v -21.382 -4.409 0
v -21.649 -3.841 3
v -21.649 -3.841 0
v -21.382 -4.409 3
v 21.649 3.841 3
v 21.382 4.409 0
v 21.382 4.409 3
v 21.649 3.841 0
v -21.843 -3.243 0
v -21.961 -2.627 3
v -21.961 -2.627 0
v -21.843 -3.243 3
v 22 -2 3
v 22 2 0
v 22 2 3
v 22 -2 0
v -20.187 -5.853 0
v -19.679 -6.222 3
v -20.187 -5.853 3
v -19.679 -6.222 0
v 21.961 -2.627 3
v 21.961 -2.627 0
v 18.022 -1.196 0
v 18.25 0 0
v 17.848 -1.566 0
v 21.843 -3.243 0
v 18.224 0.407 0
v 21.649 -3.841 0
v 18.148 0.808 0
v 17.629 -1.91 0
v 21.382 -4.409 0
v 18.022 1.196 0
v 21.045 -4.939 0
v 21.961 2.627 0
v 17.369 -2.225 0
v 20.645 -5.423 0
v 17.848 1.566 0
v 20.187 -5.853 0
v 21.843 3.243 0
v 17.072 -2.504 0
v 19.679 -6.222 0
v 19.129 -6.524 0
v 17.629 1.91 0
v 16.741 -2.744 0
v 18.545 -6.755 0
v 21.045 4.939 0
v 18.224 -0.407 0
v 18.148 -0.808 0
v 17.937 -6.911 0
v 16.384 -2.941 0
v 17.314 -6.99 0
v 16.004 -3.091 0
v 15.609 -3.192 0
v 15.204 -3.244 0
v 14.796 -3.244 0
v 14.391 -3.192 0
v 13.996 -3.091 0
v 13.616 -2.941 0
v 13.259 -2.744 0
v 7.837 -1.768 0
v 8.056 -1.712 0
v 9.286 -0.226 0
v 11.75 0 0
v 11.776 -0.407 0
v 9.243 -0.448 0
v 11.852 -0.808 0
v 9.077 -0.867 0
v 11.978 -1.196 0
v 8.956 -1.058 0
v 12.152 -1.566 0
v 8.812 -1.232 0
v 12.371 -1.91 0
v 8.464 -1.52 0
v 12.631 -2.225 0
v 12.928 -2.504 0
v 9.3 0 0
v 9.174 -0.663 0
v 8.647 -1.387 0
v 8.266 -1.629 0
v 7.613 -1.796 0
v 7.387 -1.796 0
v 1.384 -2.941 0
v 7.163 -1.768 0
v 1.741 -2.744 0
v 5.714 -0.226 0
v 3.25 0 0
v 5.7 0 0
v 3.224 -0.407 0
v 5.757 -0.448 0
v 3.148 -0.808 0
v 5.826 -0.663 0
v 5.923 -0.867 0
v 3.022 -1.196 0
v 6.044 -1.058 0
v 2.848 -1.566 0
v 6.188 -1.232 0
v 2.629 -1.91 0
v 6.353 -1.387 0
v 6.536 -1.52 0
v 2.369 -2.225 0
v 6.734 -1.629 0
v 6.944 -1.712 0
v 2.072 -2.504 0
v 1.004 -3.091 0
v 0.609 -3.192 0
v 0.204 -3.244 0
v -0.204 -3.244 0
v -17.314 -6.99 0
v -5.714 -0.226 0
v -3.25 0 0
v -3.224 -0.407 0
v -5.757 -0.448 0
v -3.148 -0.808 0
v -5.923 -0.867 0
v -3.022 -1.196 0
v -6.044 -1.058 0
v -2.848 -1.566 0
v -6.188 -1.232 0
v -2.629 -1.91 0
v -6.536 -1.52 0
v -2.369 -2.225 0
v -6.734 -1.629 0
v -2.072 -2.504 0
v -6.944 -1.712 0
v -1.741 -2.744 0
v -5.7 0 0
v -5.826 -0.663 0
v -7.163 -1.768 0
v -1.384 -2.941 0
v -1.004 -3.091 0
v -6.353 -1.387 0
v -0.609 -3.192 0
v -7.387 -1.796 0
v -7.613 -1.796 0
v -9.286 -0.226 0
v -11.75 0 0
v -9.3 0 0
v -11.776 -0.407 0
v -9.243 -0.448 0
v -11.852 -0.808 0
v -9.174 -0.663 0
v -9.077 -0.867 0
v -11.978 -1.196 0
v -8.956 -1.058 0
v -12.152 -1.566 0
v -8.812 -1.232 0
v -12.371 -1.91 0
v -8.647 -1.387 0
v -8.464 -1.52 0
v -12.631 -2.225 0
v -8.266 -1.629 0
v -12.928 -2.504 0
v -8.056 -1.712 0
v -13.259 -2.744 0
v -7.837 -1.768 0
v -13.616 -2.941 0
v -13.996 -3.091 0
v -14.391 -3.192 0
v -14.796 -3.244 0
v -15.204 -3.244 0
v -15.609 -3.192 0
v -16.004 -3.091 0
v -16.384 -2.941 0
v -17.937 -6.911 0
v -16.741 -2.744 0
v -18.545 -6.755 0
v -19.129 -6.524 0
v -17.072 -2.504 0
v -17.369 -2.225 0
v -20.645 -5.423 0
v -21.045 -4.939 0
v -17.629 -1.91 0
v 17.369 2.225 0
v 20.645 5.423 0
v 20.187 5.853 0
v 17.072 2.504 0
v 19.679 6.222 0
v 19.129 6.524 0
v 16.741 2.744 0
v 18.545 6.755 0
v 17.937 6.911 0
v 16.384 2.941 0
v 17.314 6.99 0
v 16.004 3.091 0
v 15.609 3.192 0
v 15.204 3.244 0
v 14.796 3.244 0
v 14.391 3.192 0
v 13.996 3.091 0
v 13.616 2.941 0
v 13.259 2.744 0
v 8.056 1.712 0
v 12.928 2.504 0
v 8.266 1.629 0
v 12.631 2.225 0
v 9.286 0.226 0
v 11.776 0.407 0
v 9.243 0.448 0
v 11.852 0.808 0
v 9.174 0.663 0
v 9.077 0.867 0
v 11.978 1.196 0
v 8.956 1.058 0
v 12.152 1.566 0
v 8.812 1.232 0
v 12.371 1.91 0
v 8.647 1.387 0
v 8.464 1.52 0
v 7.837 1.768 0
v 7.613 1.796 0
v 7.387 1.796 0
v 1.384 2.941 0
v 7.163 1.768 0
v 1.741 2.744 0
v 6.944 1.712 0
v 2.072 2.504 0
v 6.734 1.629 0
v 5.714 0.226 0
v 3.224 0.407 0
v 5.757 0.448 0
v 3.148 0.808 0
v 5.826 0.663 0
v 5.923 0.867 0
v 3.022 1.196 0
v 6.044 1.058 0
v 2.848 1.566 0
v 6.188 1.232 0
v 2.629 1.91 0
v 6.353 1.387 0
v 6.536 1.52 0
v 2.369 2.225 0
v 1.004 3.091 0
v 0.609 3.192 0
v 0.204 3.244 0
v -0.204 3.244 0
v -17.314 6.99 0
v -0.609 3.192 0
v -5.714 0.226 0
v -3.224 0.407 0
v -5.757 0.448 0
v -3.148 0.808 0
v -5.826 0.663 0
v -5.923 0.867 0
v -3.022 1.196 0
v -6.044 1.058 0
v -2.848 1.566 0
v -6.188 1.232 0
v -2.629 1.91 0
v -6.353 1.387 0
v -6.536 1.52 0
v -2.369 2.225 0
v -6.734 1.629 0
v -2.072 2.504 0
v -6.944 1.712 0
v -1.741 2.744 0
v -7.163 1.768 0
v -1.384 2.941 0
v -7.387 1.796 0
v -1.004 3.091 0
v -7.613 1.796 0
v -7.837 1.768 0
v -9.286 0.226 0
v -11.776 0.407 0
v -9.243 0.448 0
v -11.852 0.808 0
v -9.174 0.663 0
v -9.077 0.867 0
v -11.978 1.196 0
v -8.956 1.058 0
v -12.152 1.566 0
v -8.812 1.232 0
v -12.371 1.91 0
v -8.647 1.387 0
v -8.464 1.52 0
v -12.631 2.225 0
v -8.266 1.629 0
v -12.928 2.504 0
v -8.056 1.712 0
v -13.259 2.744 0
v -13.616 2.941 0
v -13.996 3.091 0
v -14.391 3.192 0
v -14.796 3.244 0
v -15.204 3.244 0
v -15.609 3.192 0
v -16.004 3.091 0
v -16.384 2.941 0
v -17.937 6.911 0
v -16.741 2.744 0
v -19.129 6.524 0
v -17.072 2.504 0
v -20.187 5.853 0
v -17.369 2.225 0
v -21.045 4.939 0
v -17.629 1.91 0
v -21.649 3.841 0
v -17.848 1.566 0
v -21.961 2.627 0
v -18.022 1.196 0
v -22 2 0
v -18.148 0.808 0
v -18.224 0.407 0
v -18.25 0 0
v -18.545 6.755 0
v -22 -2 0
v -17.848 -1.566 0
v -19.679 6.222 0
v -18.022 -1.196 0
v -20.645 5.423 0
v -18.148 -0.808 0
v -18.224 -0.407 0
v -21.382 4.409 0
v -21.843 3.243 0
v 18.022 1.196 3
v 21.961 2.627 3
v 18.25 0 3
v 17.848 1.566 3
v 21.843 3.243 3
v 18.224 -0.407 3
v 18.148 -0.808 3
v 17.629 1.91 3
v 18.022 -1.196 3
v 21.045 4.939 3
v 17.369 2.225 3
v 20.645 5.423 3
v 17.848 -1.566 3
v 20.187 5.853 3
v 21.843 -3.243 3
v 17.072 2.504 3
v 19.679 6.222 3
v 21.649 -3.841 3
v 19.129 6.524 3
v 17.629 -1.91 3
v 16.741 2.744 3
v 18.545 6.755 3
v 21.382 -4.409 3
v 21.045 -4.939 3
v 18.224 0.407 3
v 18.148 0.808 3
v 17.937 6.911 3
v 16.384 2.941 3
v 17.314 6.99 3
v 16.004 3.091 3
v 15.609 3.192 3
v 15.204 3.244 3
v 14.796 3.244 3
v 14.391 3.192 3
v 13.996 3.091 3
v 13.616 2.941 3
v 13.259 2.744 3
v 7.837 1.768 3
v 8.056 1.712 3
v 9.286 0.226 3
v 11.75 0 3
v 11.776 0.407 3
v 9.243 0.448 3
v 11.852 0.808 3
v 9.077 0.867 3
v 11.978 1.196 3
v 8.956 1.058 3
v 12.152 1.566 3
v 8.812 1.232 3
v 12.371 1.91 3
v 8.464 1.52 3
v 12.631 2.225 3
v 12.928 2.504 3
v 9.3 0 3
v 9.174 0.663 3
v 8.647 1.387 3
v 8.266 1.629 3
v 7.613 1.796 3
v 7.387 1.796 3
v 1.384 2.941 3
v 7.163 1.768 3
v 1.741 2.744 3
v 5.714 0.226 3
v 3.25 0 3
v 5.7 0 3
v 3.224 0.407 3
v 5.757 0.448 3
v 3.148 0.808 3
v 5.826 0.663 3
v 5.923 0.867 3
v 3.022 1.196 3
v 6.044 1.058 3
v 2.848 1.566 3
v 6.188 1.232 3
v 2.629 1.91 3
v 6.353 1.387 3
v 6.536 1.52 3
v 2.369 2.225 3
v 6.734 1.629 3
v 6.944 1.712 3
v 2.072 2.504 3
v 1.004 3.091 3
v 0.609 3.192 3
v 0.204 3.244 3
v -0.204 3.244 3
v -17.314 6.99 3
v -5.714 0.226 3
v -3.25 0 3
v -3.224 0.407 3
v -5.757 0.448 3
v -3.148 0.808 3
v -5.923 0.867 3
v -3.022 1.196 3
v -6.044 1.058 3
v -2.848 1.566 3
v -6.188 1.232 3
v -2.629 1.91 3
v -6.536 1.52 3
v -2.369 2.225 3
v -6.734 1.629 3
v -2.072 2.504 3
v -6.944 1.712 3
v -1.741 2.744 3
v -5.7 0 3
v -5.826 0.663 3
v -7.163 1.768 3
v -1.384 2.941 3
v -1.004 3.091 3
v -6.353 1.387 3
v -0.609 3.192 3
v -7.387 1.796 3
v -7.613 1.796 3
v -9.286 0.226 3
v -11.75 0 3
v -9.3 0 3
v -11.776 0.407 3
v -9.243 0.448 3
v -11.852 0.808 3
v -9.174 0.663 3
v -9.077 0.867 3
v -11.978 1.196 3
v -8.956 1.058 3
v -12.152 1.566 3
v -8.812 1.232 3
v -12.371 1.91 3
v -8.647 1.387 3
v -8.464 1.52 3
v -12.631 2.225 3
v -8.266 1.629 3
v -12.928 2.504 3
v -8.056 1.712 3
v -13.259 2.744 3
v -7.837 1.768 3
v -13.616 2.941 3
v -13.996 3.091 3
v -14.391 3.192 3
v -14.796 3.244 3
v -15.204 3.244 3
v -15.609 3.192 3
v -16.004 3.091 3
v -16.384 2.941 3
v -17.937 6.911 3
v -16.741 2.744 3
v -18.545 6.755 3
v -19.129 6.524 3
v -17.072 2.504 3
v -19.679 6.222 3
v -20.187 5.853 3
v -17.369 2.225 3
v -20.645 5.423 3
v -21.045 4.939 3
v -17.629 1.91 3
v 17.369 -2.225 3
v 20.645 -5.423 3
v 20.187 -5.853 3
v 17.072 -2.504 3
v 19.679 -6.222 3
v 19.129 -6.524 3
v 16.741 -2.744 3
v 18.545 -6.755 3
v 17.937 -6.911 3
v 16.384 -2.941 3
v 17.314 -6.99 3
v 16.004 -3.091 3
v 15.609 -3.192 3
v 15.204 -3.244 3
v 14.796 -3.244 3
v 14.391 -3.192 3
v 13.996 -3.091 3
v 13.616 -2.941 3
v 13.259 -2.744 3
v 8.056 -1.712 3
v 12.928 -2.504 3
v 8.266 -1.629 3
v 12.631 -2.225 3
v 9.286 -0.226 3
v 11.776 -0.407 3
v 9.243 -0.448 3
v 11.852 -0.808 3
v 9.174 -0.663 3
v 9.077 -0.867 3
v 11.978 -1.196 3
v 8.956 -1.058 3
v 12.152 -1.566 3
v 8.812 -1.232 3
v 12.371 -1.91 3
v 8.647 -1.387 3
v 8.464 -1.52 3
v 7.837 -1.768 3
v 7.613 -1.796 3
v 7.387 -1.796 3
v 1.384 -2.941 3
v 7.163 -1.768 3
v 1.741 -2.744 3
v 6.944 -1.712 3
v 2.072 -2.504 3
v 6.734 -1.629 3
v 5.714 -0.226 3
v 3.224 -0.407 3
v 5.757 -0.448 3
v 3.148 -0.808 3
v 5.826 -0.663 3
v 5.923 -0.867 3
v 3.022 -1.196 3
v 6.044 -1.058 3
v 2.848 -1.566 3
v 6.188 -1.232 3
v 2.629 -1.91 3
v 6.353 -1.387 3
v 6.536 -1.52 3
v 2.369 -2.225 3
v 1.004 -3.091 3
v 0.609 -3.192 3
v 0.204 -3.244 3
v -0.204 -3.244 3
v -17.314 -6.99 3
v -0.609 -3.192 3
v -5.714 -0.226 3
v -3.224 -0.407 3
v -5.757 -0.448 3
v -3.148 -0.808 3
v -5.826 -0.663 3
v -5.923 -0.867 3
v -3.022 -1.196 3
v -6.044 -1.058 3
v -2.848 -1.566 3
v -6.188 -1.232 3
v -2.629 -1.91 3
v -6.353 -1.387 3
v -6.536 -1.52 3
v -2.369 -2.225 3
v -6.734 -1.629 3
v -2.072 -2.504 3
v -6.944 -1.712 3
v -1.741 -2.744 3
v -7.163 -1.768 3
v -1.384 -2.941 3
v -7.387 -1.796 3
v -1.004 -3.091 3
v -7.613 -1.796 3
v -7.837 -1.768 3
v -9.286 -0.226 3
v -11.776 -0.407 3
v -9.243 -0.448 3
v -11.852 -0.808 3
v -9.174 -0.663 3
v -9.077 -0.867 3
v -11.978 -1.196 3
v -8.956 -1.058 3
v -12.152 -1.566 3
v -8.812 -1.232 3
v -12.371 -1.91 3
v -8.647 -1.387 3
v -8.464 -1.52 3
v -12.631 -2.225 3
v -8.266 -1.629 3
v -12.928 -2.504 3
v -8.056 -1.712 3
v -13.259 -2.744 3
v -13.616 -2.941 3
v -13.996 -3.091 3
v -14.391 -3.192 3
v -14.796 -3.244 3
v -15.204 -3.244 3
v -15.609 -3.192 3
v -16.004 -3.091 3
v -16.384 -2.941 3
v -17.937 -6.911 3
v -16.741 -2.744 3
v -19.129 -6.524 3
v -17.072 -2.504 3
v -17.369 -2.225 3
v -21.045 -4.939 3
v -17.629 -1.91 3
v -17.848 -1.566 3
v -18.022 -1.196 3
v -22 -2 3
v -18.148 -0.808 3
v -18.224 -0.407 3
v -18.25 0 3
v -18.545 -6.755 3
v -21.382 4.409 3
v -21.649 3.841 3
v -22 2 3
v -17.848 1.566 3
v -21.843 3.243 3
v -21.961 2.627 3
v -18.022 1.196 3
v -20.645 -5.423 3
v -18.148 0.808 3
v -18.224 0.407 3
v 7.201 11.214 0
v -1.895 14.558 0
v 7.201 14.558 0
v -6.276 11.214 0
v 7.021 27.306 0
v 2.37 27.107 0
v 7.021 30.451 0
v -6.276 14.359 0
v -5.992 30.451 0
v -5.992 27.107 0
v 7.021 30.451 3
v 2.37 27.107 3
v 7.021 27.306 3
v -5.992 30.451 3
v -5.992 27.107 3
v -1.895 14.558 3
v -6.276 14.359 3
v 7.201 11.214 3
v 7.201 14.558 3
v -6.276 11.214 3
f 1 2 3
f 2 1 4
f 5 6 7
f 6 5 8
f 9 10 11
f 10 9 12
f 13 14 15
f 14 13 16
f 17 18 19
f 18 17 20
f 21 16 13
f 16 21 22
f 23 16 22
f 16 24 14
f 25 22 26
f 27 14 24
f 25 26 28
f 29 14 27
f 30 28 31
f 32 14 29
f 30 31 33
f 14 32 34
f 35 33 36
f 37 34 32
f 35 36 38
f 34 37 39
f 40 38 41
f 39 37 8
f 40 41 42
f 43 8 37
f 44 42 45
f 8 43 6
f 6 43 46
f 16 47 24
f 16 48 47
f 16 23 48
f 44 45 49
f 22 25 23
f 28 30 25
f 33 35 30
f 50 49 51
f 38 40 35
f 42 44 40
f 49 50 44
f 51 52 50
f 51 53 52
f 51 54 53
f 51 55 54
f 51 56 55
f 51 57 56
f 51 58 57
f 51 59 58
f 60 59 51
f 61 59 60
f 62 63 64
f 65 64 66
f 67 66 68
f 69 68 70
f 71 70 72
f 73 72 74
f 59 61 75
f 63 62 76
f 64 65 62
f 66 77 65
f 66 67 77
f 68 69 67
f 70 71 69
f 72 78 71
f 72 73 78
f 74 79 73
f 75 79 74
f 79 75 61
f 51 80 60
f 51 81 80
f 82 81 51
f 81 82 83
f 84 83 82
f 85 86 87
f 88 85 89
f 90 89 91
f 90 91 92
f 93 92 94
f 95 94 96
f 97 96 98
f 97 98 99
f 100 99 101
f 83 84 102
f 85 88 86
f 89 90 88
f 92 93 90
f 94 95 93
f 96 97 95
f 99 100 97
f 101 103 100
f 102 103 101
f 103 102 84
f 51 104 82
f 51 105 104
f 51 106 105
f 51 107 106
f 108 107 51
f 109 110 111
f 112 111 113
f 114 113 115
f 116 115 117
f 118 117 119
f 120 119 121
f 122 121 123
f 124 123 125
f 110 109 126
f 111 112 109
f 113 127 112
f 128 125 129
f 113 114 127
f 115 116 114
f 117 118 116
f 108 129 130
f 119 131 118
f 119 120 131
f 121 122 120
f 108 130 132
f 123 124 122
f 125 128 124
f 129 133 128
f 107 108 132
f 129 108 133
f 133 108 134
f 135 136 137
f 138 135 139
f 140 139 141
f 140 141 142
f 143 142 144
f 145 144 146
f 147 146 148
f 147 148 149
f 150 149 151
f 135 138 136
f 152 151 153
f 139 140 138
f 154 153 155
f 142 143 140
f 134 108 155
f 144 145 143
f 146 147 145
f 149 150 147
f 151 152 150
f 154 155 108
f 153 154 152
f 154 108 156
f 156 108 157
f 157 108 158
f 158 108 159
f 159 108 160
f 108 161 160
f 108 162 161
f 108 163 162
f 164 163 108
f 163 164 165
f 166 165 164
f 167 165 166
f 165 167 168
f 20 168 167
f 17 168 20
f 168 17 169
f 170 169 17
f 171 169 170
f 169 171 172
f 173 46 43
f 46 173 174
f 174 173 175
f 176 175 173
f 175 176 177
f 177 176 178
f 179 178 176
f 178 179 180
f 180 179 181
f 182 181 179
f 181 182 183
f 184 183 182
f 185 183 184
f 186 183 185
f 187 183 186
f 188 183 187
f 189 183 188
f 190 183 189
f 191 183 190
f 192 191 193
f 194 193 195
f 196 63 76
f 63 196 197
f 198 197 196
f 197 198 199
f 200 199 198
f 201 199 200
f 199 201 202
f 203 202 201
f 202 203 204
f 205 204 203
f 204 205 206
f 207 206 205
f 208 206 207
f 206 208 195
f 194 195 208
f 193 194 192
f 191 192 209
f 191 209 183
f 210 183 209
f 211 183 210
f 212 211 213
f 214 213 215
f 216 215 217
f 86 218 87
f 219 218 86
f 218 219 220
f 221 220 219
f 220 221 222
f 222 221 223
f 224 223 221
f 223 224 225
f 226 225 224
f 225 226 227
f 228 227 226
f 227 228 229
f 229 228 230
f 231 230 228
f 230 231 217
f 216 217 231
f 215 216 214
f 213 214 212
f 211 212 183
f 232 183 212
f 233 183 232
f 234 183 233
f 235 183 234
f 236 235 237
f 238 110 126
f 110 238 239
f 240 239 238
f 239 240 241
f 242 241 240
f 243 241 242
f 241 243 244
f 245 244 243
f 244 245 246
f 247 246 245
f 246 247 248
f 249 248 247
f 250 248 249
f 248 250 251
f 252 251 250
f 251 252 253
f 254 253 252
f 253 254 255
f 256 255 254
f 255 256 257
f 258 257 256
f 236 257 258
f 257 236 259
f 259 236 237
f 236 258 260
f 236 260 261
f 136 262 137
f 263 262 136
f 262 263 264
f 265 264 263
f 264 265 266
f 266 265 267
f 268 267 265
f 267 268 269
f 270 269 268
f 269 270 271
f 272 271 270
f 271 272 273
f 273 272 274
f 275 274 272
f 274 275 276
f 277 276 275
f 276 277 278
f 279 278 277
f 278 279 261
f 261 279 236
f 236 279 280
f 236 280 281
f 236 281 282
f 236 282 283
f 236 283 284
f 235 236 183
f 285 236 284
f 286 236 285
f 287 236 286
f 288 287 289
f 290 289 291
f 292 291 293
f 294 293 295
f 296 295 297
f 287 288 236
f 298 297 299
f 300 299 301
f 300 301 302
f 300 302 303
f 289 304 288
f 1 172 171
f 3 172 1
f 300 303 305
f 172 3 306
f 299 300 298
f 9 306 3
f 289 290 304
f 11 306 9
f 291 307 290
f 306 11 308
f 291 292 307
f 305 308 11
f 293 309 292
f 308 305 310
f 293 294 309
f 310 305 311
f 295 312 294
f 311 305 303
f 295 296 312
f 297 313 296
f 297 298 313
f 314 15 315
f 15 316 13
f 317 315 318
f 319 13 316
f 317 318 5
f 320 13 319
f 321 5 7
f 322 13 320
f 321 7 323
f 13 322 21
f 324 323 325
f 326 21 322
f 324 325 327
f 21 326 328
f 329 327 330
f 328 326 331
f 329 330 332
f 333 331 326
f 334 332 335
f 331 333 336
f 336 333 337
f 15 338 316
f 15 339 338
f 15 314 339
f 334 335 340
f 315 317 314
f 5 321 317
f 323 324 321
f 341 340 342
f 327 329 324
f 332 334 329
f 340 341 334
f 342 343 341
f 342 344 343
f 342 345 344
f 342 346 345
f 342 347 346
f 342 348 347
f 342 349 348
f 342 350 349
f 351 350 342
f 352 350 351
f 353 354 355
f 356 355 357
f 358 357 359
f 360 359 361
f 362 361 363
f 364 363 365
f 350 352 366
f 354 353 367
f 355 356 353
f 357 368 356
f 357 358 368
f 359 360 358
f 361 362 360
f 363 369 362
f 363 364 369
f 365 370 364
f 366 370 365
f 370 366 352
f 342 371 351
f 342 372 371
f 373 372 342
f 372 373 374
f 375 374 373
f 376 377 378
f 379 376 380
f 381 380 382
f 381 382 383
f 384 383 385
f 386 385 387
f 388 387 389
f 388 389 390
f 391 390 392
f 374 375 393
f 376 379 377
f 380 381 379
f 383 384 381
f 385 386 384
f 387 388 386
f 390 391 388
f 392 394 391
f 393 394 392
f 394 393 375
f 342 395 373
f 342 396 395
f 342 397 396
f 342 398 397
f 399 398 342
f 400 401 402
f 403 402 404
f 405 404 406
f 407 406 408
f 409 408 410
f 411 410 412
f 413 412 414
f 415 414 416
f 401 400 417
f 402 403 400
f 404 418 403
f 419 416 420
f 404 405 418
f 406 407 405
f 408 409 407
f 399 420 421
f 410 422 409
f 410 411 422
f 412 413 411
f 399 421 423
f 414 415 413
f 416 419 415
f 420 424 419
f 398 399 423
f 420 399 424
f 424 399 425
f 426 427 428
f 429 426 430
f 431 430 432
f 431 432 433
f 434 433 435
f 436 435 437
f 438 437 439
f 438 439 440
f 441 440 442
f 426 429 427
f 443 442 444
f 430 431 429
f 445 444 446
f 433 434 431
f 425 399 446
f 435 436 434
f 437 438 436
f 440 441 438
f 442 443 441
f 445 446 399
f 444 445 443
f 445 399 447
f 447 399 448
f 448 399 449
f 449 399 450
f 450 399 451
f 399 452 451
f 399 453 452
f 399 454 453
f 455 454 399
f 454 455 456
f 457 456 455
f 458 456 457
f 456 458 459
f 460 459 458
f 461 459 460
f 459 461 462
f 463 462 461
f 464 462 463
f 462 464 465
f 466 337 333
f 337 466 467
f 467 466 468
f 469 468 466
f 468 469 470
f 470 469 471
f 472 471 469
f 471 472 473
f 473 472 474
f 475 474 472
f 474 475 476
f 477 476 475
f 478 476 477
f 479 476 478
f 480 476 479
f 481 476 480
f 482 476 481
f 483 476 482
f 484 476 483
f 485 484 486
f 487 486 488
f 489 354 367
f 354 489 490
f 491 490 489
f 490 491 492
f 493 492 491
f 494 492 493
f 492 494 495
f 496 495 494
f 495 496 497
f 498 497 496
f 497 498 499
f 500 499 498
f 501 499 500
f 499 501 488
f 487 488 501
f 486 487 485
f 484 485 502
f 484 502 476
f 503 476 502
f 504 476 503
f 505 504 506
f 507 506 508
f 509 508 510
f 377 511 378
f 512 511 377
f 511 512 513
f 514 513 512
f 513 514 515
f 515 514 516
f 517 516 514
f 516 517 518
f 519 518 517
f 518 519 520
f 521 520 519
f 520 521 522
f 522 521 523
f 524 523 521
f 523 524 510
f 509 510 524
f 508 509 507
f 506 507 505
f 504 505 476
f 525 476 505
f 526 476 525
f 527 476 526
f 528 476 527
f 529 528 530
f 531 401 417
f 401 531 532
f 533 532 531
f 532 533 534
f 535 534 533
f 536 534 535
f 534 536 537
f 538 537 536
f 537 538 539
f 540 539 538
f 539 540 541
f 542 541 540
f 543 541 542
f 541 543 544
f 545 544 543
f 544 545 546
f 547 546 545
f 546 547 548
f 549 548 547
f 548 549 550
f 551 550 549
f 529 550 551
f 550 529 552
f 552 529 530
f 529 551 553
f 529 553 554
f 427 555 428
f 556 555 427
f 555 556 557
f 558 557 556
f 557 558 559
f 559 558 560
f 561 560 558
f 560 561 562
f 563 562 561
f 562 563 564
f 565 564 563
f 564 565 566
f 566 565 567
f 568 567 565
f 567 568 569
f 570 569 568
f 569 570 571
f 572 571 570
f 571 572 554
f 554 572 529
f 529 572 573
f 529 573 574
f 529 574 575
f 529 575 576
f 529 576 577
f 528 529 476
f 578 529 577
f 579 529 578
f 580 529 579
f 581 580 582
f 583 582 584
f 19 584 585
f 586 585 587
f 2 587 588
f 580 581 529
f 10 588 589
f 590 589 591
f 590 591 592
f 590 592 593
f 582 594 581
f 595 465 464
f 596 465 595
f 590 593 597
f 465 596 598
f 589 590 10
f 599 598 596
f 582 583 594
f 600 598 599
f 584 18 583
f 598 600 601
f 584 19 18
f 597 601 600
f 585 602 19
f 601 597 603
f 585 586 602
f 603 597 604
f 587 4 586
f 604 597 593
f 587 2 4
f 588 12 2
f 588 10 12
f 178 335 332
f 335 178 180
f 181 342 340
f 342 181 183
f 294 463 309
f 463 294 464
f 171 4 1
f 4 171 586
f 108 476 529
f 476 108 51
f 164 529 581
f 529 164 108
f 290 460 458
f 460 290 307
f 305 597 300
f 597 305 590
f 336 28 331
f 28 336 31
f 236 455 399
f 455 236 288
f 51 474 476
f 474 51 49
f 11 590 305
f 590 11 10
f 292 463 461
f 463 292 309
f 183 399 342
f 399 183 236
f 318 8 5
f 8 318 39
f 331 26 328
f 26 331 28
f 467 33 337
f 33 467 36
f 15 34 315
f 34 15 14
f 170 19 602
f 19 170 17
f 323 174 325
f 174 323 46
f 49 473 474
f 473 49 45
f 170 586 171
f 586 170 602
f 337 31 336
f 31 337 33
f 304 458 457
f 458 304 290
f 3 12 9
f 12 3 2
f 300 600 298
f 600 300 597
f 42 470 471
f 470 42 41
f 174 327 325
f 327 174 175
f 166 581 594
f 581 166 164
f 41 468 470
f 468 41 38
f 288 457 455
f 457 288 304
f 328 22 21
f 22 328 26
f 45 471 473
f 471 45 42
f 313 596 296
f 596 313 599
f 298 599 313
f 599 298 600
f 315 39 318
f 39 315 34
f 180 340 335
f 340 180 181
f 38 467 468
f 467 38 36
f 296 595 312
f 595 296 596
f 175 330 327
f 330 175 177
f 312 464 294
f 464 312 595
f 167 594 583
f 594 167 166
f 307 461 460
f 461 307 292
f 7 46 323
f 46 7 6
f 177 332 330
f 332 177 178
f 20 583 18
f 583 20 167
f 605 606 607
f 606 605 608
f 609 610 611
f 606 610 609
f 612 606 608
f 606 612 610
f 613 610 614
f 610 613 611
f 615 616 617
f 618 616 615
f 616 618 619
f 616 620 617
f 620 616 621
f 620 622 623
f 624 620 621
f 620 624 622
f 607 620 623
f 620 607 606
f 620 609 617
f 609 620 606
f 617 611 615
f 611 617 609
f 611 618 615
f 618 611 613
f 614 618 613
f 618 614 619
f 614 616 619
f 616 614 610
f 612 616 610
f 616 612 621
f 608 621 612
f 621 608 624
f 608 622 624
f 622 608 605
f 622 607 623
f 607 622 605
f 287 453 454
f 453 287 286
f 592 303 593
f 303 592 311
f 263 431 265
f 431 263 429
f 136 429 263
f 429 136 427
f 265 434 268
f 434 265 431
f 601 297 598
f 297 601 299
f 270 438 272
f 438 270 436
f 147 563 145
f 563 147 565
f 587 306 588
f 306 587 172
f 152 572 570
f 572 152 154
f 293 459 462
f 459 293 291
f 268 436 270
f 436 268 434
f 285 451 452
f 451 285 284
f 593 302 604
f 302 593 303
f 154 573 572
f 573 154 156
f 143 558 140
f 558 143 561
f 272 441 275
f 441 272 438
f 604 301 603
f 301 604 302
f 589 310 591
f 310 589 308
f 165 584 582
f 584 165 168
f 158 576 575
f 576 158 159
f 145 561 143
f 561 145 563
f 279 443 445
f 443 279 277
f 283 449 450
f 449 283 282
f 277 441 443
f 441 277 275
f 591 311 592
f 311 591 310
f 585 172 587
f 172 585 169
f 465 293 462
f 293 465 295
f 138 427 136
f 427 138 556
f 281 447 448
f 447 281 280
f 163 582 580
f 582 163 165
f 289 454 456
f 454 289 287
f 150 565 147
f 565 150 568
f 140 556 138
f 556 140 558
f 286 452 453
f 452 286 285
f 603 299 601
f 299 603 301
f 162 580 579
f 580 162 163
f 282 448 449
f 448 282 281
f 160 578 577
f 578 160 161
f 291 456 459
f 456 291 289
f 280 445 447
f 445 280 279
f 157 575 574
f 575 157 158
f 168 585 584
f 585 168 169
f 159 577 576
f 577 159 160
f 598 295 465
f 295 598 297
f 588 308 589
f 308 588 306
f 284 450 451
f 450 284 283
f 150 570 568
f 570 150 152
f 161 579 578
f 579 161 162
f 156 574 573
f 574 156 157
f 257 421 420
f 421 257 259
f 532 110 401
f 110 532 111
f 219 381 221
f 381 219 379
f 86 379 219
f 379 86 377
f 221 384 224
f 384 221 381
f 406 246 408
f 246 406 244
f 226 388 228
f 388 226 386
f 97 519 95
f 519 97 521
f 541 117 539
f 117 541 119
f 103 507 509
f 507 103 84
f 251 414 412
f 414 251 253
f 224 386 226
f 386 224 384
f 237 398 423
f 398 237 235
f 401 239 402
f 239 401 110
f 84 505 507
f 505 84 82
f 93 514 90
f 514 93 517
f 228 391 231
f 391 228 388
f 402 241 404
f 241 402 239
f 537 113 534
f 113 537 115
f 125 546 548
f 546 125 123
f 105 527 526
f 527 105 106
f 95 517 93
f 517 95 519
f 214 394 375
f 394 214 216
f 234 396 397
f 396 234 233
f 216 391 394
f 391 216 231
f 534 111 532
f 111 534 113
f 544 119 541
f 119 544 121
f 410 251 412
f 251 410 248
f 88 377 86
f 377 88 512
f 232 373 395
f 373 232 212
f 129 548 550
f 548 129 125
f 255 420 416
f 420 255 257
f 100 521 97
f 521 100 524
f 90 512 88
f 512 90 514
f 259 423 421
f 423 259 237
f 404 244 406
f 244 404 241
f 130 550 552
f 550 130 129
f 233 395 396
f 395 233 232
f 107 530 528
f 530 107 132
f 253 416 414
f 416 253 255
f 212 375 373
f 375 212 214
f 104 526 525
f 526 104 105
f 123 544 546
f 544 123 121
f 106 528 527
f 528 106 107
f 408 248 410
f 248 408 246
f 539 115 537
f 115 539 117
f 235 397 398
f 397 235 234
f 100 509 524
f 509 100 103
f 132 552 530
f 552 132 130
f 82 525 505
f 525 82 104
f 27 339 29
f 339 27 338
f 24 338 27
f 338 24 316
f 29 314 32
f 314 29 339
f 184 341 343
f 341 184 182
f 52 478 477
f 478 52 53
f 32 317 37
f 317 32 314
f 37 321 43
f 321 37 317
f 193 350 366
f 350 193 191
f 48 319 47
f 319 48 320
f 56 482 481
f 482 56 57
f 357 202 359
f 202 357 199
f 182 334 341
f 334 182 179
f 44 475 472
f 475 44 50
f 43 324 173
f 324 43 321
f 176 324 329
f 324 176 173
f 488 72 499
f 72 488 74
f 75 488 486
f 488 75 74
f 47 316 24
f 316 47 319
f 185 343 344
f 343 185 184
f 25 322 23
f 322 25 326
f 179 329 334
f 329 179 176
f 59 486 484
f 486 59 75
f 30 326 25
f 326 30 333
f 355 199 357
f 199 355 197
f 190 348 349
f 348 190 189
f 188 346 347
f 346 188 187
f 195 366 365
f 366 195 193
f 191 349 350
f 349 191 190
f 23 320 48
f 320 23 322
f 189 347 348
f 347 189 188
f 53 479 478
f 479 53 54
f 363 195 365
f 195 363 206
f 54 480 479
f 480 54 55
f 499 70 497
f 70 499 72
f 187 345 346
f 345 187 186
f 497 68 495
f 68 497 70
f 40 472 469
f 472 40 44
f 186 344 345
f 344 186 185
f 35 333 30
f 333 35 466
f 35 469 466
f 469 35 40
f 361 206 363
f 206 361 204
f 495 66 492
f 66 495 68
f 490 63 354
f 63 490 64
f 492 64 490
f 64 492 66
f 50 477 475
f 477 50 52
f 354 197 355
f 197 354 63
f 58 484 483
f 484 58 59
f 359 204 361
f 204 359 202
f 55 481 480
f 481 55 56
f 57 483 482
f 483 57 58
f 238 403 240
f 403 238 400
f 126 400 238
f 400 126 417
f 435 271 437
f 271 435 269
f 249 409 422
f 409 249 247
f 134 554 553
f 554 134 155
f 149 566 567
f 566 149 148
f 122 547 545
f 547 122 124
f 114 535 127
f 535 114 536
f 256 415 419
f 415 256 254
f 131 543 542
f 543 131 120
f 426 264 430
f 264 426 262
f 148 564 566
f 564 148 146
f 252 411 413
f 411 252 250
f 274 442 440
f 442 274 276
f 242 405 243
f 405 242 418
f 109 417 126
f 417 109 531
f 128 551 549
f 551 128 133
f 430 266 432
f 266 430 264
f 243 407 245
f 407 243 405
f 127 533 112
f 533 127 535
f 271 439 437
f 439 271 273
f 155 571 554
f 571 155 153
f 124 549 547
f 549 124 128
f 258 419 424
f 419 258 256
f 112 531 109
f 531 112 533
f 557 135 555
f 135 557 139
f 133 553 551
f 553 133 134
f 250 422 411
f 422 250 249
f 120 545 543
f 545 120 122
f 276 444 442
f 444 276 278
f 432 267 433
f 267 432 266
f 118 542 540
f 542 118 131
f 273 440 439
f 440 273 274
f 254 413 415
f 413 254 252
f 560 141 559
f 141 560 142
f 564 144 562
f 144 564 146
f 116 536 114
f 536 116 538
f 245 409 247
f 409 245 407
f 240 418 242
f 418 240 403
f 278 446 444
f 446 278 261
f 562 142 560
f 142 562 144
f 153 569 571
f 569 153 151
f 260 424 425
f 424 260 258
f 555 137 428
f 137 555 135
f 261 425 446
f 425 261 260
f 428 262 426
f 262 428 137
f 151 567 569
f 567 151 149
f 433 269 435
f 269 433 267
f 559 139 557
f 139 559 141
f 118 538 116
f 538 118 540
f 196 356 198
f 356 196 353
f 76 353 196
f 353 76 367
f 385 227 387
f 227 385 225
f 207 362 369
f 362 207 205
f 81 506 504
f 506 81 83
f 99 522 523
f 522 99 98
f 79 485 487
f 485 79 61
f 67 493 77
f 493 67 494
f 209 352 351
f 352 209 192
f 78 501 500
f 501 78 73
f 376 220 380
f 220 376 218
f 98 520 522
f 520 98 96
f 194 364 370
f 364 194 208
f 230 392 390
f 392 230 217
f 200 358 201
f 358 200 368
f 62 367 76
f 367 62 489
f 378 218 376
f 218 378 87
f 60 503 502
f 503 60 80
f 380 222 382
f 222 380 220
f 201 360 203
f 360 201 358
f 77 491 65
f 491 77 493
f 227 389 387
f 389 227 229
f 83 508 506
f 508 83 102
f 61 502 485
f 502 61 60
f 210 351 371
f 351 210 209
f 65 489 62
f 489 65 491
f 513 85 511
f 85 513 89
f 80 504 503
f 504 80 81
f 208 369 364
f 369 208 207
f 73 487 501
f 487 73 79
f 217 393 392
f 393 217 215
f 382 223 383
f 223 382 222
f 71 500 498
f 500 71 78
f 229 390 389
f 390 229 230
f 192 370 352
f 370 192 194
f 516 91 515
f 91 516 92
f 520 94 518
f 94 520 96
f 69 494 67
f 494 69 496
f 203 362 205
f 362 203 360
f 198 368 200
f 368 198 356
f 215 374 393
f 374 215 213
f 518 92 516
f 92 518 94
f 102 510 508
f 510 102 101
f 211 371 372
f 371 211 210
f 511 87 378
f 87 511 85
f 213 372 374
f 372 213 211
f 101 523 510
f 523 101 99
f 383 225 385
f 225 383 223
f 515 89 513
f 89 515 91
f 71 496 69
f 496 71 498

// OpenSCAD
$fn = 50;


difference() {
	union() {
		hull() {
			translate(v = [-17.0000000000, 2.0000000000, 0]) {
				cylinder(h = 3, r = 5);
			}
			translate(v = [17.0000000000, 2.0000000000, 0]) {
				cylinder(h = 3, r = 5);
			}
			translate(v = [-17.0000000000, -2.0000000000, 0]) {
				cylinder(h = 3, r = 5);
			}
			translate(v = [17.0000000000, -2.0000000000, 0]) {
				cylinder(h = 3, r = 5);
			}
		}
		translate(v = [0, 30.0000000000, 0]) {
			linear_extrude(height = 3) {
				text(font = "DejaVu Sans Mono:style=Bold", halign = "center", size = 19.0000000000, text = "Z", valign = "top");
			}
		}
	}
	union() {
		translate(v = [-15.0000000000, 0.0000000000, 0]) {
			translate(v = [0, 0, -100]) {
				cylinder(h = 200, r = 3.2500000000);
			}
		}
		translate(v = [0, 0, -100]) {
			cylinder(h = 200, r = 3.2500000000);
		}
		translate(v = [15.0000000000, 0.0000000000, 0]) {
			translate(v = [0, 0, -100]) {
				cylinder(h = 200, r = 3.2500000000);
			}
		}
		translate(v = [-15.0000000000, 0.0000000000, 0]) {
			translate(v = [0, 0, -100]) {
				cylinder(h = 200, r = 1.8000000000);
			}
		}
		translate(v = [-7.5000000000, 0.0000000000, 0]) {
			translate(v = [0, 0, -100]) {
				cylinder(h = 200, r = 1.8000000000);
			}
		}
		translate(v = [0, 0, -100]) {
			cylinder(h = 200, r = 1.8000000000);
		}
		translate(v = [7.5000000000, 0.0000000000, 0]) {
			translate(v = [0, 0, -100]) {
				cylinder(h = 200, r = 1.8000000000);
			}
		}
		translate(v = [15.0000000000, 0.0000000000, 0]) {
			translate(v = [0, 0, -100]) {
				cylinder(h = 200, r = 1.8000000000);
			}
		}
	}
}
